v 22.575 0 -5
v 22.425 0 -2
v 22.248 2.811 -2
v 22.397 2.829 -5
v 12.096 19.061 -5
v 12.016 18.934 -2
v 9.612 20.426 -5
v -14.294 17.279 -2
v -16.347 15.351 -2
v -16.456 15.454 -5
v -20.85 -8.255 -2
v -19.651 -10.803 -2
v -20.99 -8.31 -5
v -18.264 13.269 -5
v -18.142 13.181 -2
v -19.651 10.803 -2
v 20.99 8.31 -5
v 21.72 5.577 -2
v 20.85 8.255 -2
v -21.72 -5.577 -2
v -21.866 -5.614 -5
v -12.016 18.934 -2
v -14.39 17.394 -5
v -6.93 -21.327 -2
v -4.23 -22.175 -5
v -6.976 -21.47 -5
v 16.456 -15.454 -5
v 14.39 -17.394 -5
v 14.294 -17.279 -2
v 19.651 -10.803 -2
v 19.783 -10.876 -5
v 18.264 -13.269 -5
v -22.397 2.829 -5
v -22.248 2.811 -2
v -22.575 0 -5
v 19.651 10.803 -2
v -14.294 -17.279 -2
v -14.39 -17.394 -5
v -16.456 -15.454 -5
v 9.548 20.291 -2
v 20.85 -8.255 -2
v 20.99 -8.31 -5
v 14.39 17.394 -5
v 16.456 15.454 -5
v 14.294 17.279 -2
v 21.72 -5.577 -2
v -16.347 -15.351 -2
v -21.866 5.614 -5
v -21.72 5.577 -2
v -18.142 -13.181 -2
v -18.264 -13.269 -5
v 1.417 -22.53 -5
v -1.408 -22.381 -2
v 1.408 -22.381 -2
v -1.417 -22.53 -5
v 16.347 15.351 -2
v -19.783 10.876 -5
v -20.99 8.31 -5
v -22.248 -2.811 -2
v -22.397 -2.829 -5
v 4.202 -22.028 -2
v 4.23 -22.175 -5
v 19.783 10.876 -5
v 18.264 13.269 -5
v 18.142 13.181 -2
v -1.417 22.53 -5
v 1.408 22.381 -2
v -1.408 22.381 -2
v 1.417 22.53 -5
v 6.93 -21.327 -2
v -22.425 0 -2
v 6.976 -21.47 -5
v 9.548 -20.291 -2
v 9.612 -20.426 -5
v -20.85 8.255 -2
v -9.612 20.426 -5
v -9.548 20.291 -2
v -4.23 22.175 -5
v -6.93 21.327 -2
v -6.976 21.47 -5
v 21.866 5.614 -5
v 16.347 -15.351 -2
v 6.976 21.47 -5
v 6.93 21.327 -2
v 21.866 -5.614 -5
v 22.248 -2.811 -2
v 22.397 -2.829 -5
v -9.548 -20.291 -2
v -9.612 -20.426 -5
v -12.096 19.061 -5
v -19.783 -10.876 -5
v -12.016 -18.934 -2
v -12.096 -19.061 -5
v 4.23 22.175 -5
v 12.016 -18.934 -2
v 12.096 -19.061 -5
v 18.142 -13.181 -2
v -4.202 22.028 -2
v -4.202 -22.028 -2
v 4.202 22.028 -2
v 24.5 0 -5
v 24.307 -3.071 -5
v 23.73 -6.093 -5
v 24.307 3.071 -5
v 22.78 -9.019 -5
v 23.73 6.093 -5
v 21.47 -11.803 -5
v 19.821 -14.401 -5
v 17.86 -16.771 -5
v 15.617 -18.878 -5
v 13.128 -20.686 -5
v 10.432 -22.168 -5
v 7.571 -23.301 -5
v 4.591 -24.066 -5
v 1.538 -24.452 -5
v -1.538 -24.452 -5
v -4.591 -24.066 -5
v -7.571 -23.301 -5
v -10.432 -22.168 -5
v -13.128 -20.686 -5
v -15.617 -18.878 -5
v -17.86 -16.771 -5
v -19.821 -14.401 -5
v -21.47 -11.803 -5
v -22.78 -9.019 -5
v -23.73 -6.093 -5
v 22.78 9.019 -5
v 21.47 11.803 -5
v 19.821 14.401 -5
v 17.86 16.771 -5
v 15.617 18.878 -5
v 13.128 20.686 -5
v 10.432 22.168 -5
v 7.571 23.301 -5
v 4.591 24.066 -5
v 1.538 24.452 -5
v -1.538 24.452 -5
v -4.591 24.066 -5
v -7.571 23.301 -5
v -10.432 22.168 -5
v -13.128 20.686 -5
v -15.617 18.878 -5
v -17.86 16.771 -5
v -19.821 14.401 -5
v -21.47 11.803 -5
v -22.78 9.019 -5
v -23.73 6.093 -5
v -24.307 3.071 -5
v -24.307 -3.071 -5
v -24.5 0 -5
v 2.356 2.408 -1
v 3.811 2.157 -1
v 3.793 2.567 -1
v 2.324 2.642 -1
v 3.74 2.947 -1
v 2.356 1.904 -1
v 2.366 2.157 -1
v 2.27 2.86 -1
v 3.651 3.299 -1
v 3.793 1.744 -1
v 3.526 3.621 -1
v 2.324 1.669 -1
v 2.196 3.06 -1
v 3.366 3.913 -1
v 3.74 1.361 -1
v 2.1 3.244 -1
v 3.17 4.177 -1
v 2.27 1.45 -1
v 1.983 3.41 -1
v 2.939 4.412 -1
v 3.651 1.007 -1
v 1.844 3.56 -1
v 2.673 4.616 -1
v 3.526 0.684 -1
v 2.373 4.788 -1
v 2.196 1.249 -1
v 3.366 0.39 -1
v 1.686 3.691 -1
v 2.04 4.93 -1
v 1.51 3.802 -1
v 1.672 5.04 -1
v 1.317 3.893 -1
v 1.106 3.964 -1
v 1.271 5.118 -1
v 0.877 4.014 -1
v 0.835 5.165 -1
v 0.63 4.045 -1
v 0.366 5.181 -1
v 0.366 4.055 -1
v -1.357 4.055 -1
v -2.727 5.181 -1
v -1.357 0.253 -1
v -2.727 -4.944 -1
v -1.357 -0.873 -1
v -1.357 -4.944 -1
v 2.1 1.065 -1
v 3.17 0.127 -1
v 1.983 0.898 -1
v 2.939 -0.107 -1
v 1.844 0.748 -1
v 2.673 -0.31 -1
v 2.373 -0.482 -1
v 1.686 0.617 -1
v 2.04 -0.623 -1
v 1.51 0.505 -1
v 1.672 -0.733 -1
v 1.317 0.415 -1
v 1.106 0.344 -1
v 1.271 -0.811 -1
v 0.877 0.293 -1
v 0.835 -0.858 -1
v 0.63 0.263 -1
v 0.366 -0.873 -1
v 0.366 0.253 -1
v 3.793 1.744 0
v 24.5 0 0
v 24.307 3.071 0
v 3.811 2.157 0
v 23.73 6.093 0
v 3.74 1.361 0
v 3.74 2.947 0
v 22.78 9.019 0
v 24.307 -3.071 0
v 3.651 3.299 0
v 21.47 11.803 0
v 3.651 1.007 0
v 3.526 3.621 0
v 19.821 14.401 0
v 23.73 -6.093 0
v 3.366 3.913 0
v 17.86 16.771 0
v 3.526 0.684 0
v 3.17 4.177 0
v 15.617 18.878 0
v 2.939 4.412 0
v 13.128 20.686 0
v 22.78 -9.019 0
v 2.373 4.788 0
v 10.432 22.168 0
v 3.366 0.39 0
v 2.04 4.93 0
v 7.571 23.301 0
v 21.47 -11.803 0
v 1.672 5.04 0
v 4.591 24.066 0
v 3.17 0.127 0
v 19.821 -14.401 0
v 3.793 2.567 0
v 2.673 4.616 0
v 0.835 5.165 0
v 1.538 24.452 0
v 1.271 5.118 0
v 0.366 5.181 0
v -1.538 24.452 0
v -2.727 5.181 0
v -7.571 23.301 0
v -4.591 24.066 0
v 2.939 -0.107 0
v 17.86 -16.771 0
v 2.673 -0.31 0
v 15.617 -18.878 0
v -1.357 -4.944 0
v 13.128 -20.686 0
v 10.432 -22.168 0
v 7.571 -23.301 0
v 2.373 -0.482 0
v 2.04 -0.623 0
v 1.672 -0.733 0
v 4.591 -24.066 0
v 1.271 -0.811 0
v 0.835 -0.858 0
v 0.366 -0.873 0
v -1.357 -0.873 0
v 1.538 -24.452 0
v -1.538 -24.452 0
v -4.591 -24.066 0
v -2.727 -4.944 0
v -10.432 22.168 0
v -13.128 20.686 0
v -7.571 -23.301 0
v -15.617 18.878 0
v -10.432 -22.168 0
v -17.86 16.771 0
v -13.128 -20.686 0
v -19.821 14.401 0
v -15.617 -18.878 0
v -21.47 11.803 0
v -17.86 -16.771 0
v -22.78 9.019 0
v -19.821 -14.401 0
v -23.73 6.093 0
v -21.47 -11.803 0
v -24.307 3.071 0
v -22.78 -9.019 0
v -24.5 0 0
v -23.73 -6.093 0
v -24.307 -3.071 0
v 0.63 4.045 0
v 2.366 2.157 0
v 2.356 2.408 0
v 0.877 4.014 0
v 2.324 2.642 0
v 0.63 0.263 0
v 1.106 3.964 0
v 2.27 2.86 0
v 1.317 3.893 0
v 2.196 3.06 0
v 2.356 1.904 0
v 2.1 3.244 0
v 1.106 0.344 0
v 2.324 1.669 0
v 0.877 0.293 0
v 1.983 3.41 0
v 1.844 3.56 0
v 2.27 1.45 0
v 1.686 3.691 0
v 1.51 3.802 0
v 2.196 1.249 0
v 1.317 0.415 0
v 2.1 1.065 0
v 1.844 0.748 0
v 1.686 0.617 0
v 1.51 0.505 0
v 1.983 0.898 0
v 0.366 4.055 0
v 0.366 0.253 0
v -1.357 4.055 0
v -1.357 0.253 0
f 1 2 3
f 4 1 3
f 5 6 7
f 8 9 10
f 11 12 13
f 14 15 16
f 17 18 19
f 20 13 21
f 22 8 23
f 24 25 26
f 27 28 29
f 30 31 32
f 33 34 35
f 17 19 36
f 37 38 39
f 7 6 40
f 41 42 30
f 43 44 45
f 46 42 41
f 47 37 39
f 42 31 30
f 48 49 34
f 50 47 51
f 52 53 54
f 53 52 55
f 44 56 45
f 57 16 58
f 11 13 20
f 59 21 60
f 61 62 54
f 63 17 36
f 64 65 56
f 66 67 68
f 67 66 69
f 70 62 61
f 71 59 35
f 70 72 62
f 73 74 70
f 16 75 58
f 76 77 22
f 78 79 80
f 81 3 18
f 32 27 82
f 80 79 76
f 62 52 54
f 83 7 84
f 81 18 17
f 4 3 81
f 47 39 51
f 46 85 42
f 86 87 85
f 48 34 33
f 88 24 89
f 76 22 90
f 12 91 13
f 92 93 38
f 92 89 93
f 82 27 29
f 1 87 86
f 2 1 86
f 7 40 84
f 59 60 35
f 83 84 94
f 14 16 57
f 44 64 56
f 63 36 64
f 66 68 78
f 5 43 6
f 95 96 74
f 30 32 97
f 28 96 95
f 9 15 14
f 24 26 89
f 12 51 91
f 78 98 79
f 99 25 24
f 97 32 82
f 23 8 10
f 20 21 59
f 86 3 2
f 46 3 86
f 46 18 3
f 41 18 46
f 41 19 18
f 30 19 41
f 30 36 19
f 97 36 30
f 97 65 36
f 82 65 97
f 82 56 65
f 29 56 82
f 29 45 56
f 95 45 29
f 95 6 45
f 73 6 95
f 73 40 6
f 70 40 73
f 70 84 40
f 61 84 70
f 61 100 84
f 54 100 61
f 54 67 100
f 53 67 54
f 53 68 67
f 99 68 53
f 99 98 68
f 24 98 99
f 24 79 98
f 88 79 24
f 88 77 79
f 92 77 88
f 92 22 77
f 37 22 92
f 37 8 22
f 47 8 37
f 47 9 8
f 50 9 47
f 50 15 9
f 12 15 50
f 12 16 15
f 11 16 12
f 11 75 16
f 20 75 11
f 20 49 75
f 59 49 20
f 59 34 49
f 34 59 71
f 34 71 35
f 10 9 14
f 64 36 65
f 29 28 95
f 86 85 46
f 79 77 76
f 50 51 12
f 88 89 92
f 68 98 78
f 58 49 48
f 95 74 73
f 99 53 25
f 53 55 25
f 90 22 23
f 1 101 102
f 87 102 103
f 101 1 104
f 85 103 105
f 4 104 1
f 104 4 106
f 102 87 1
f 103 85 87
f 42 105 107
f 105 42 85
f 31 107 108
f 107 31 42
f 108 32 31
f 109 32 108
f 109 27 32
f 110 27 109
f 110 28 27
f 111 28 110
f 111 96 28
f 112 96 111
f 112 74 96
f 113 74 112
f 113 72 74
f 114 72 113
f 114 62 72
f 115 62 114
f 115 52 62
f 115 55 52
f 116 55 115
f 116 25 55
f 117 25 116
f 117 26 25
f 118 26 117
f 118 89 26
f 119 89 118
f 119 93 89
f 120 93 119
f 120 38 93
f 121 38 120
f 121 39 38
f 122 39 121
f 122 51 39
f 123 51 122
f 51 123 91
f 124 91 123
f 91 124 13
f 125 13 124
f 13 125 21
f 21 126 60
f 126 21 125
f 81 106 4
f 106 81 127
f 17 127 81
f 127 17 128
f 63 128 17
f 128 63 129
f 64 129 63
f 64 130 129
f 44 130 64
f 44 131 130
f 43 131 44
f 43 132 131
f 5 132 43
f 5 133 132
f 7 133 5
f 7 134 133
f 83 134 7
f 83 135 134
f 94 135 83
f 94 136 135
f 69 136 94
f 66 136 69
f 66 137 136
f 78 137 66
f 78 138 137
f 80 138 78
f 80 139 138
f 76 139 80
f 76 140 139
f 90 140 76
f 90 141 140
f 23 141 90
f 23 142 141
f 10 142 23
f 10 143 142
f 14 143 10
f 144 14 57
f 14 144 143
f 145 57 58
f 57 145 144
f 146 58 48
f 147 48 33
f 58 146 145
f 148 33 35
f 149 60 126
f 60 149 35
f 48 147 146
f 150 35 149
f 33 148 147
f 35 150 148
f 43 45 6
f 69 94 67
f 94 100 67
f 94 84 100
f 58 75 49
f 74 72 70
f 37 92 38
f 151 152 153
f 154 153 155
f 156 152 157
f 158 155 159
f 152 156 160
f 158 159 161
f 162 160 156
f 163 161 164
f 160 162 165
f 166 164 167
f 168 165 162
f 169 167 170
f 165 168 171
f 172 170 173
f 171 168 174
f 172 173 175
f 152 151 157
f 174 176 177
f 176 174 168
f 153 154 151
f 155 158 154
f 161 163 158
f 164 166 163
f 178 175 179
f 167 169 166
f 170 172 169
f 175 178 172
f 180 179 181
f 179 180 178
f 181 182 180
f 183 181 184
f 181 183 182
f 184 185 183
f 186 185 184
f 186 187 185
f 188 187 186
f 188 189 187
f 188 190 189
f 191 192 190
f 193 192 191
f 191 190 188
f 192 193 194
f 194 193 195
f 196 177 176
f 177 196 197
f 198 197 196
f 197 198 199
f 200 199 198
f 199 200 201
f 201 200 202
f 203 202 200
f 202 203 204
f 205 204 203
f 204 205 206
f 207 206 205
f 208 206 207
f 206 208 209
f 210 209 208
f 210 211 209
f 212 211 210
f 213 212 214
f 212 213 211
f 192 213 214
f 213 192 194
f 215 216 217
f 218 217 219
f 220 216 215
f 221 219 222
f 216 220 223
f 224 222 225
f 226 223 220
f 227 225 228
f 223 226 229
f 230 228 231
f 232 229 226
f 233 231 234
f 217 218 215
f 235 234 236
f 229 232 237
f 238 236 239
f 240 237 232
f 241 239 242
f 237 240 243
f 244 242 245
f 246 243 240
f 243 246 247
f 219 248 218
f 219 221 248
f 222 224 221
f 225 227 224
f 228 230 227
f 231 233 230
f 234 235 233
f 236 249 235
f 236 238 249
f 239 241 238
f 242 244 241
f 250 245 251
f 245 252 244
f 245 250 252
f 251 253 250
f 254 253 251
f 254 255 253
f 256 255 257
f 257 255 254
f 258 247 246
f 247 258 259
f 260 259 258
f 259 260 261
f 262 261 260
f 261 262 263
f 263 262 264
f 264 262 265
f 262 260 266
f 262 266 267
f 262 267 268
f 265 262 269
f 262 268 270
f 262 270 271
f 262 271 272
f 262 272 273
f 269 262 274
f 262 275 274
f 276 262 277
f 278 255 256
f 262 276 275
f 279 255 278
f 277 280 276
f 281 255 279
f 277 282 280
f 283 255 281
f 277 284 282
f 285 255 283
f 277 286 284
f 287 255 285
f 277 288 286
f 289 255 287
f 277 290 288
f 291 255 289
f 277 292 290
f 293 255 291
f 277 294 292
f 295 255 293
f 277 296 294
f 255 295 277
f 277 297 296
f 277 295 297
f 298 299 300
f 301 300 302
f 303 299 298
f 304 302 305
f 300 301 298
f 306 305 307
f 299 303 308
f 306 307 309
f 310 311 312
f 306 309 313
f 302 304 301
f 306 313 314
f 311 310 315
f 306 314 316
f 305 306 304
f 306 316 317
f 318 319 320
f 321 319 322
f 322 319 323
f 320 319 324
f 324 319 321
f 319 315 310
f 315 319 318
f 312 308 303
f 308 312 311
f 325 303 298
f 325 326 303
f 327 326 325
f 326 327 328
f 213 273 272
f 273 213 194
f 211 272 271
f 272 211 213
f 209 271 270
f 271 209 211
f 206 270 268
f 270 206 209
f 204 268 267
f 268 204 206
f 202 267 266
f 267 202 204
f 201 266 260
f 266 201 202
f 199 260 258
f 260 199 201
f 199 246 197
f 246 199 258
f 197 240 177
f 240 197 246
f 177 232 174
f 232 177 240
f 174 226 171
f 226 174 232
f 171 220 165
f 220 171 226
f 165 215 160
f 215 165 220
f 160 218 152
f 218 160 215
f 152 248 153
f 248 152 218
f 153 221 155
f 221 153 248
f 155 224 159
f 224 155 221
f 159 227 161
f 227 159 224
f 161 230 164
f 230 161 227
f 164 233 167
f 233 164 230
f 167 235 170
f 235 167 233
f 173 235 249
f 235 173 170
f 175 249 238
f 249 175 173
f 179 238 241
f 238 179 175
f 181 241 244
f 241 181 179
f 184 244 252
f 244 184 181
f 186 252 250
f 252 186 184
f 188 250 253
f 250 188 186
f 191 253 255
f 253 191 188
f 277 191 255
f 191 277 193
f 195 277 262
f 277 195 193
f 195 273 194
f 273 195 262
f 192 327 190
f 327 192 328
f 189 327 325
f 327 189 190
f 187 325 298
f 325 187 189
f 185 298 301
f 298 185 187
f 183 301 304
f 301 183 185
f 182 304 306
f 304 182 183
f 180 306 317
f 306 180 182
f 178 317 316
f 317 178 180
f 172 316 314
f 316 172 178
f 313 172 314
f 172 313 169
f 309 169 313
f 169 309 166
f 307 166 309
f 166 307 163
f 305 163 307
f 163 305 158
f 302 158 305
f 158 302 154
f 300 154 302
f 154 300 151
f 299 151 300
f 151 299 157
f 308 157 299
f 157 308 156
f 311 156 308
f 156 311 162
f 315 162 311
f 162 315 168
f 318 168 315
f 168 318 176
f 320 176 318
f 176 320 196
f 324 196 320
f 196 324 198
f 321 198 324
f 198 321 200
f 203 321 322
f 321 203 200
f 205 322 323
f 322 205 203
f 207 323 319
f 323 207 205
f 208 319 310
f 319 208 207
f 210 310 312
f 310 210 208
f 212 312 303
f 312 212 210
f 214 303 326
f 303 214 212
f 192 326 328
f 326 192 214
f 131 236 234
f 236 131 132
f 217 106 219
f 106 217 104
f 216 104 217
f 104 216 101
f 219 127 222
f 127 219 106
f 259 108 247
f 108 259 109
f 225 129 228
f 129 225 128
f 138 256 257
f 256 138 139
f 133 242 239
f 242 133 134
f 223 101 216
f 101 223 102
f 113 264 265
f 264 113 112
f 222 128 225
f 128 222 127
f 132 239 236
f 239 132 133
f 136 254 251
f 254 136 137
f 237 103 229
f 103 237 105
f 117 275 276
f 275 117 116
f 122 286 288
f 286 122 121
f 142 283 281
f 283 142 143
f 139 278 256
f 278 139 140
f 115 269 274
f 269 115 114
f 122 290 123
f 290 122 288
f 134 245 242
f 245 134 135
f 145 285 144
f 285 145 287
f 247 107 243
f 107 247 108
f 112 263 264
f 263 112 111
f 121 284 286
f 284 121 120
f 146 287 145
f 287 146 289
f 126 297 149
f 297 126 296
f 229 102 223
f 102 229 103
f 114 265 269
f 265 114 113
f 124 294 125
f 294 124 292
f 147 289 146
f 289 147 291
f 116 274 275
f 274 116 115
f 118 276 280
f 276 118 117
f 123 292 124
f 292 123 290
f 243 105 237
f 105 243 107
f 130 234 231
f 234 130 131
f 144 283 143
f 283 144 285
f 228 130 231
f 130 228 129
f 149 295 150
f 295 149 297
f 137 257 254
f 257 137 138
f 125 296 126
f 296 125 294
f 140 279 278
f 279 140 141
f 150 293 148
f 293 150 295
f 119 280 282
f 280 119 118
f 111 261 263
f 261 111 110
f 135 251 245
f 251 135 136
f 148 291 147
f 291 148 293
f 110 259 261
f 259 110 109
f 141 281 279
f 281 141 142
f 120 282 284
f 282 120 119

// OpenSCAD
$fn = 50;

difference() {
	union() {
		translate(v = [0, 0, -5.0]) {
			cylinder(h = 5, r = 24.5);
		}
	}
	union() {
		#translate(v = [0, 0, -5.0]) {
			cylinder(h = 3, r1 = 22.575, r2 = 22.425);
		}
		translate(v = [0, 0, -1]) {
			linear_extrude(height = 1) {
				text(font = "Impact", halign = "center", size = 10, text = "P", valign = "center");
			}
		}
	}
}
